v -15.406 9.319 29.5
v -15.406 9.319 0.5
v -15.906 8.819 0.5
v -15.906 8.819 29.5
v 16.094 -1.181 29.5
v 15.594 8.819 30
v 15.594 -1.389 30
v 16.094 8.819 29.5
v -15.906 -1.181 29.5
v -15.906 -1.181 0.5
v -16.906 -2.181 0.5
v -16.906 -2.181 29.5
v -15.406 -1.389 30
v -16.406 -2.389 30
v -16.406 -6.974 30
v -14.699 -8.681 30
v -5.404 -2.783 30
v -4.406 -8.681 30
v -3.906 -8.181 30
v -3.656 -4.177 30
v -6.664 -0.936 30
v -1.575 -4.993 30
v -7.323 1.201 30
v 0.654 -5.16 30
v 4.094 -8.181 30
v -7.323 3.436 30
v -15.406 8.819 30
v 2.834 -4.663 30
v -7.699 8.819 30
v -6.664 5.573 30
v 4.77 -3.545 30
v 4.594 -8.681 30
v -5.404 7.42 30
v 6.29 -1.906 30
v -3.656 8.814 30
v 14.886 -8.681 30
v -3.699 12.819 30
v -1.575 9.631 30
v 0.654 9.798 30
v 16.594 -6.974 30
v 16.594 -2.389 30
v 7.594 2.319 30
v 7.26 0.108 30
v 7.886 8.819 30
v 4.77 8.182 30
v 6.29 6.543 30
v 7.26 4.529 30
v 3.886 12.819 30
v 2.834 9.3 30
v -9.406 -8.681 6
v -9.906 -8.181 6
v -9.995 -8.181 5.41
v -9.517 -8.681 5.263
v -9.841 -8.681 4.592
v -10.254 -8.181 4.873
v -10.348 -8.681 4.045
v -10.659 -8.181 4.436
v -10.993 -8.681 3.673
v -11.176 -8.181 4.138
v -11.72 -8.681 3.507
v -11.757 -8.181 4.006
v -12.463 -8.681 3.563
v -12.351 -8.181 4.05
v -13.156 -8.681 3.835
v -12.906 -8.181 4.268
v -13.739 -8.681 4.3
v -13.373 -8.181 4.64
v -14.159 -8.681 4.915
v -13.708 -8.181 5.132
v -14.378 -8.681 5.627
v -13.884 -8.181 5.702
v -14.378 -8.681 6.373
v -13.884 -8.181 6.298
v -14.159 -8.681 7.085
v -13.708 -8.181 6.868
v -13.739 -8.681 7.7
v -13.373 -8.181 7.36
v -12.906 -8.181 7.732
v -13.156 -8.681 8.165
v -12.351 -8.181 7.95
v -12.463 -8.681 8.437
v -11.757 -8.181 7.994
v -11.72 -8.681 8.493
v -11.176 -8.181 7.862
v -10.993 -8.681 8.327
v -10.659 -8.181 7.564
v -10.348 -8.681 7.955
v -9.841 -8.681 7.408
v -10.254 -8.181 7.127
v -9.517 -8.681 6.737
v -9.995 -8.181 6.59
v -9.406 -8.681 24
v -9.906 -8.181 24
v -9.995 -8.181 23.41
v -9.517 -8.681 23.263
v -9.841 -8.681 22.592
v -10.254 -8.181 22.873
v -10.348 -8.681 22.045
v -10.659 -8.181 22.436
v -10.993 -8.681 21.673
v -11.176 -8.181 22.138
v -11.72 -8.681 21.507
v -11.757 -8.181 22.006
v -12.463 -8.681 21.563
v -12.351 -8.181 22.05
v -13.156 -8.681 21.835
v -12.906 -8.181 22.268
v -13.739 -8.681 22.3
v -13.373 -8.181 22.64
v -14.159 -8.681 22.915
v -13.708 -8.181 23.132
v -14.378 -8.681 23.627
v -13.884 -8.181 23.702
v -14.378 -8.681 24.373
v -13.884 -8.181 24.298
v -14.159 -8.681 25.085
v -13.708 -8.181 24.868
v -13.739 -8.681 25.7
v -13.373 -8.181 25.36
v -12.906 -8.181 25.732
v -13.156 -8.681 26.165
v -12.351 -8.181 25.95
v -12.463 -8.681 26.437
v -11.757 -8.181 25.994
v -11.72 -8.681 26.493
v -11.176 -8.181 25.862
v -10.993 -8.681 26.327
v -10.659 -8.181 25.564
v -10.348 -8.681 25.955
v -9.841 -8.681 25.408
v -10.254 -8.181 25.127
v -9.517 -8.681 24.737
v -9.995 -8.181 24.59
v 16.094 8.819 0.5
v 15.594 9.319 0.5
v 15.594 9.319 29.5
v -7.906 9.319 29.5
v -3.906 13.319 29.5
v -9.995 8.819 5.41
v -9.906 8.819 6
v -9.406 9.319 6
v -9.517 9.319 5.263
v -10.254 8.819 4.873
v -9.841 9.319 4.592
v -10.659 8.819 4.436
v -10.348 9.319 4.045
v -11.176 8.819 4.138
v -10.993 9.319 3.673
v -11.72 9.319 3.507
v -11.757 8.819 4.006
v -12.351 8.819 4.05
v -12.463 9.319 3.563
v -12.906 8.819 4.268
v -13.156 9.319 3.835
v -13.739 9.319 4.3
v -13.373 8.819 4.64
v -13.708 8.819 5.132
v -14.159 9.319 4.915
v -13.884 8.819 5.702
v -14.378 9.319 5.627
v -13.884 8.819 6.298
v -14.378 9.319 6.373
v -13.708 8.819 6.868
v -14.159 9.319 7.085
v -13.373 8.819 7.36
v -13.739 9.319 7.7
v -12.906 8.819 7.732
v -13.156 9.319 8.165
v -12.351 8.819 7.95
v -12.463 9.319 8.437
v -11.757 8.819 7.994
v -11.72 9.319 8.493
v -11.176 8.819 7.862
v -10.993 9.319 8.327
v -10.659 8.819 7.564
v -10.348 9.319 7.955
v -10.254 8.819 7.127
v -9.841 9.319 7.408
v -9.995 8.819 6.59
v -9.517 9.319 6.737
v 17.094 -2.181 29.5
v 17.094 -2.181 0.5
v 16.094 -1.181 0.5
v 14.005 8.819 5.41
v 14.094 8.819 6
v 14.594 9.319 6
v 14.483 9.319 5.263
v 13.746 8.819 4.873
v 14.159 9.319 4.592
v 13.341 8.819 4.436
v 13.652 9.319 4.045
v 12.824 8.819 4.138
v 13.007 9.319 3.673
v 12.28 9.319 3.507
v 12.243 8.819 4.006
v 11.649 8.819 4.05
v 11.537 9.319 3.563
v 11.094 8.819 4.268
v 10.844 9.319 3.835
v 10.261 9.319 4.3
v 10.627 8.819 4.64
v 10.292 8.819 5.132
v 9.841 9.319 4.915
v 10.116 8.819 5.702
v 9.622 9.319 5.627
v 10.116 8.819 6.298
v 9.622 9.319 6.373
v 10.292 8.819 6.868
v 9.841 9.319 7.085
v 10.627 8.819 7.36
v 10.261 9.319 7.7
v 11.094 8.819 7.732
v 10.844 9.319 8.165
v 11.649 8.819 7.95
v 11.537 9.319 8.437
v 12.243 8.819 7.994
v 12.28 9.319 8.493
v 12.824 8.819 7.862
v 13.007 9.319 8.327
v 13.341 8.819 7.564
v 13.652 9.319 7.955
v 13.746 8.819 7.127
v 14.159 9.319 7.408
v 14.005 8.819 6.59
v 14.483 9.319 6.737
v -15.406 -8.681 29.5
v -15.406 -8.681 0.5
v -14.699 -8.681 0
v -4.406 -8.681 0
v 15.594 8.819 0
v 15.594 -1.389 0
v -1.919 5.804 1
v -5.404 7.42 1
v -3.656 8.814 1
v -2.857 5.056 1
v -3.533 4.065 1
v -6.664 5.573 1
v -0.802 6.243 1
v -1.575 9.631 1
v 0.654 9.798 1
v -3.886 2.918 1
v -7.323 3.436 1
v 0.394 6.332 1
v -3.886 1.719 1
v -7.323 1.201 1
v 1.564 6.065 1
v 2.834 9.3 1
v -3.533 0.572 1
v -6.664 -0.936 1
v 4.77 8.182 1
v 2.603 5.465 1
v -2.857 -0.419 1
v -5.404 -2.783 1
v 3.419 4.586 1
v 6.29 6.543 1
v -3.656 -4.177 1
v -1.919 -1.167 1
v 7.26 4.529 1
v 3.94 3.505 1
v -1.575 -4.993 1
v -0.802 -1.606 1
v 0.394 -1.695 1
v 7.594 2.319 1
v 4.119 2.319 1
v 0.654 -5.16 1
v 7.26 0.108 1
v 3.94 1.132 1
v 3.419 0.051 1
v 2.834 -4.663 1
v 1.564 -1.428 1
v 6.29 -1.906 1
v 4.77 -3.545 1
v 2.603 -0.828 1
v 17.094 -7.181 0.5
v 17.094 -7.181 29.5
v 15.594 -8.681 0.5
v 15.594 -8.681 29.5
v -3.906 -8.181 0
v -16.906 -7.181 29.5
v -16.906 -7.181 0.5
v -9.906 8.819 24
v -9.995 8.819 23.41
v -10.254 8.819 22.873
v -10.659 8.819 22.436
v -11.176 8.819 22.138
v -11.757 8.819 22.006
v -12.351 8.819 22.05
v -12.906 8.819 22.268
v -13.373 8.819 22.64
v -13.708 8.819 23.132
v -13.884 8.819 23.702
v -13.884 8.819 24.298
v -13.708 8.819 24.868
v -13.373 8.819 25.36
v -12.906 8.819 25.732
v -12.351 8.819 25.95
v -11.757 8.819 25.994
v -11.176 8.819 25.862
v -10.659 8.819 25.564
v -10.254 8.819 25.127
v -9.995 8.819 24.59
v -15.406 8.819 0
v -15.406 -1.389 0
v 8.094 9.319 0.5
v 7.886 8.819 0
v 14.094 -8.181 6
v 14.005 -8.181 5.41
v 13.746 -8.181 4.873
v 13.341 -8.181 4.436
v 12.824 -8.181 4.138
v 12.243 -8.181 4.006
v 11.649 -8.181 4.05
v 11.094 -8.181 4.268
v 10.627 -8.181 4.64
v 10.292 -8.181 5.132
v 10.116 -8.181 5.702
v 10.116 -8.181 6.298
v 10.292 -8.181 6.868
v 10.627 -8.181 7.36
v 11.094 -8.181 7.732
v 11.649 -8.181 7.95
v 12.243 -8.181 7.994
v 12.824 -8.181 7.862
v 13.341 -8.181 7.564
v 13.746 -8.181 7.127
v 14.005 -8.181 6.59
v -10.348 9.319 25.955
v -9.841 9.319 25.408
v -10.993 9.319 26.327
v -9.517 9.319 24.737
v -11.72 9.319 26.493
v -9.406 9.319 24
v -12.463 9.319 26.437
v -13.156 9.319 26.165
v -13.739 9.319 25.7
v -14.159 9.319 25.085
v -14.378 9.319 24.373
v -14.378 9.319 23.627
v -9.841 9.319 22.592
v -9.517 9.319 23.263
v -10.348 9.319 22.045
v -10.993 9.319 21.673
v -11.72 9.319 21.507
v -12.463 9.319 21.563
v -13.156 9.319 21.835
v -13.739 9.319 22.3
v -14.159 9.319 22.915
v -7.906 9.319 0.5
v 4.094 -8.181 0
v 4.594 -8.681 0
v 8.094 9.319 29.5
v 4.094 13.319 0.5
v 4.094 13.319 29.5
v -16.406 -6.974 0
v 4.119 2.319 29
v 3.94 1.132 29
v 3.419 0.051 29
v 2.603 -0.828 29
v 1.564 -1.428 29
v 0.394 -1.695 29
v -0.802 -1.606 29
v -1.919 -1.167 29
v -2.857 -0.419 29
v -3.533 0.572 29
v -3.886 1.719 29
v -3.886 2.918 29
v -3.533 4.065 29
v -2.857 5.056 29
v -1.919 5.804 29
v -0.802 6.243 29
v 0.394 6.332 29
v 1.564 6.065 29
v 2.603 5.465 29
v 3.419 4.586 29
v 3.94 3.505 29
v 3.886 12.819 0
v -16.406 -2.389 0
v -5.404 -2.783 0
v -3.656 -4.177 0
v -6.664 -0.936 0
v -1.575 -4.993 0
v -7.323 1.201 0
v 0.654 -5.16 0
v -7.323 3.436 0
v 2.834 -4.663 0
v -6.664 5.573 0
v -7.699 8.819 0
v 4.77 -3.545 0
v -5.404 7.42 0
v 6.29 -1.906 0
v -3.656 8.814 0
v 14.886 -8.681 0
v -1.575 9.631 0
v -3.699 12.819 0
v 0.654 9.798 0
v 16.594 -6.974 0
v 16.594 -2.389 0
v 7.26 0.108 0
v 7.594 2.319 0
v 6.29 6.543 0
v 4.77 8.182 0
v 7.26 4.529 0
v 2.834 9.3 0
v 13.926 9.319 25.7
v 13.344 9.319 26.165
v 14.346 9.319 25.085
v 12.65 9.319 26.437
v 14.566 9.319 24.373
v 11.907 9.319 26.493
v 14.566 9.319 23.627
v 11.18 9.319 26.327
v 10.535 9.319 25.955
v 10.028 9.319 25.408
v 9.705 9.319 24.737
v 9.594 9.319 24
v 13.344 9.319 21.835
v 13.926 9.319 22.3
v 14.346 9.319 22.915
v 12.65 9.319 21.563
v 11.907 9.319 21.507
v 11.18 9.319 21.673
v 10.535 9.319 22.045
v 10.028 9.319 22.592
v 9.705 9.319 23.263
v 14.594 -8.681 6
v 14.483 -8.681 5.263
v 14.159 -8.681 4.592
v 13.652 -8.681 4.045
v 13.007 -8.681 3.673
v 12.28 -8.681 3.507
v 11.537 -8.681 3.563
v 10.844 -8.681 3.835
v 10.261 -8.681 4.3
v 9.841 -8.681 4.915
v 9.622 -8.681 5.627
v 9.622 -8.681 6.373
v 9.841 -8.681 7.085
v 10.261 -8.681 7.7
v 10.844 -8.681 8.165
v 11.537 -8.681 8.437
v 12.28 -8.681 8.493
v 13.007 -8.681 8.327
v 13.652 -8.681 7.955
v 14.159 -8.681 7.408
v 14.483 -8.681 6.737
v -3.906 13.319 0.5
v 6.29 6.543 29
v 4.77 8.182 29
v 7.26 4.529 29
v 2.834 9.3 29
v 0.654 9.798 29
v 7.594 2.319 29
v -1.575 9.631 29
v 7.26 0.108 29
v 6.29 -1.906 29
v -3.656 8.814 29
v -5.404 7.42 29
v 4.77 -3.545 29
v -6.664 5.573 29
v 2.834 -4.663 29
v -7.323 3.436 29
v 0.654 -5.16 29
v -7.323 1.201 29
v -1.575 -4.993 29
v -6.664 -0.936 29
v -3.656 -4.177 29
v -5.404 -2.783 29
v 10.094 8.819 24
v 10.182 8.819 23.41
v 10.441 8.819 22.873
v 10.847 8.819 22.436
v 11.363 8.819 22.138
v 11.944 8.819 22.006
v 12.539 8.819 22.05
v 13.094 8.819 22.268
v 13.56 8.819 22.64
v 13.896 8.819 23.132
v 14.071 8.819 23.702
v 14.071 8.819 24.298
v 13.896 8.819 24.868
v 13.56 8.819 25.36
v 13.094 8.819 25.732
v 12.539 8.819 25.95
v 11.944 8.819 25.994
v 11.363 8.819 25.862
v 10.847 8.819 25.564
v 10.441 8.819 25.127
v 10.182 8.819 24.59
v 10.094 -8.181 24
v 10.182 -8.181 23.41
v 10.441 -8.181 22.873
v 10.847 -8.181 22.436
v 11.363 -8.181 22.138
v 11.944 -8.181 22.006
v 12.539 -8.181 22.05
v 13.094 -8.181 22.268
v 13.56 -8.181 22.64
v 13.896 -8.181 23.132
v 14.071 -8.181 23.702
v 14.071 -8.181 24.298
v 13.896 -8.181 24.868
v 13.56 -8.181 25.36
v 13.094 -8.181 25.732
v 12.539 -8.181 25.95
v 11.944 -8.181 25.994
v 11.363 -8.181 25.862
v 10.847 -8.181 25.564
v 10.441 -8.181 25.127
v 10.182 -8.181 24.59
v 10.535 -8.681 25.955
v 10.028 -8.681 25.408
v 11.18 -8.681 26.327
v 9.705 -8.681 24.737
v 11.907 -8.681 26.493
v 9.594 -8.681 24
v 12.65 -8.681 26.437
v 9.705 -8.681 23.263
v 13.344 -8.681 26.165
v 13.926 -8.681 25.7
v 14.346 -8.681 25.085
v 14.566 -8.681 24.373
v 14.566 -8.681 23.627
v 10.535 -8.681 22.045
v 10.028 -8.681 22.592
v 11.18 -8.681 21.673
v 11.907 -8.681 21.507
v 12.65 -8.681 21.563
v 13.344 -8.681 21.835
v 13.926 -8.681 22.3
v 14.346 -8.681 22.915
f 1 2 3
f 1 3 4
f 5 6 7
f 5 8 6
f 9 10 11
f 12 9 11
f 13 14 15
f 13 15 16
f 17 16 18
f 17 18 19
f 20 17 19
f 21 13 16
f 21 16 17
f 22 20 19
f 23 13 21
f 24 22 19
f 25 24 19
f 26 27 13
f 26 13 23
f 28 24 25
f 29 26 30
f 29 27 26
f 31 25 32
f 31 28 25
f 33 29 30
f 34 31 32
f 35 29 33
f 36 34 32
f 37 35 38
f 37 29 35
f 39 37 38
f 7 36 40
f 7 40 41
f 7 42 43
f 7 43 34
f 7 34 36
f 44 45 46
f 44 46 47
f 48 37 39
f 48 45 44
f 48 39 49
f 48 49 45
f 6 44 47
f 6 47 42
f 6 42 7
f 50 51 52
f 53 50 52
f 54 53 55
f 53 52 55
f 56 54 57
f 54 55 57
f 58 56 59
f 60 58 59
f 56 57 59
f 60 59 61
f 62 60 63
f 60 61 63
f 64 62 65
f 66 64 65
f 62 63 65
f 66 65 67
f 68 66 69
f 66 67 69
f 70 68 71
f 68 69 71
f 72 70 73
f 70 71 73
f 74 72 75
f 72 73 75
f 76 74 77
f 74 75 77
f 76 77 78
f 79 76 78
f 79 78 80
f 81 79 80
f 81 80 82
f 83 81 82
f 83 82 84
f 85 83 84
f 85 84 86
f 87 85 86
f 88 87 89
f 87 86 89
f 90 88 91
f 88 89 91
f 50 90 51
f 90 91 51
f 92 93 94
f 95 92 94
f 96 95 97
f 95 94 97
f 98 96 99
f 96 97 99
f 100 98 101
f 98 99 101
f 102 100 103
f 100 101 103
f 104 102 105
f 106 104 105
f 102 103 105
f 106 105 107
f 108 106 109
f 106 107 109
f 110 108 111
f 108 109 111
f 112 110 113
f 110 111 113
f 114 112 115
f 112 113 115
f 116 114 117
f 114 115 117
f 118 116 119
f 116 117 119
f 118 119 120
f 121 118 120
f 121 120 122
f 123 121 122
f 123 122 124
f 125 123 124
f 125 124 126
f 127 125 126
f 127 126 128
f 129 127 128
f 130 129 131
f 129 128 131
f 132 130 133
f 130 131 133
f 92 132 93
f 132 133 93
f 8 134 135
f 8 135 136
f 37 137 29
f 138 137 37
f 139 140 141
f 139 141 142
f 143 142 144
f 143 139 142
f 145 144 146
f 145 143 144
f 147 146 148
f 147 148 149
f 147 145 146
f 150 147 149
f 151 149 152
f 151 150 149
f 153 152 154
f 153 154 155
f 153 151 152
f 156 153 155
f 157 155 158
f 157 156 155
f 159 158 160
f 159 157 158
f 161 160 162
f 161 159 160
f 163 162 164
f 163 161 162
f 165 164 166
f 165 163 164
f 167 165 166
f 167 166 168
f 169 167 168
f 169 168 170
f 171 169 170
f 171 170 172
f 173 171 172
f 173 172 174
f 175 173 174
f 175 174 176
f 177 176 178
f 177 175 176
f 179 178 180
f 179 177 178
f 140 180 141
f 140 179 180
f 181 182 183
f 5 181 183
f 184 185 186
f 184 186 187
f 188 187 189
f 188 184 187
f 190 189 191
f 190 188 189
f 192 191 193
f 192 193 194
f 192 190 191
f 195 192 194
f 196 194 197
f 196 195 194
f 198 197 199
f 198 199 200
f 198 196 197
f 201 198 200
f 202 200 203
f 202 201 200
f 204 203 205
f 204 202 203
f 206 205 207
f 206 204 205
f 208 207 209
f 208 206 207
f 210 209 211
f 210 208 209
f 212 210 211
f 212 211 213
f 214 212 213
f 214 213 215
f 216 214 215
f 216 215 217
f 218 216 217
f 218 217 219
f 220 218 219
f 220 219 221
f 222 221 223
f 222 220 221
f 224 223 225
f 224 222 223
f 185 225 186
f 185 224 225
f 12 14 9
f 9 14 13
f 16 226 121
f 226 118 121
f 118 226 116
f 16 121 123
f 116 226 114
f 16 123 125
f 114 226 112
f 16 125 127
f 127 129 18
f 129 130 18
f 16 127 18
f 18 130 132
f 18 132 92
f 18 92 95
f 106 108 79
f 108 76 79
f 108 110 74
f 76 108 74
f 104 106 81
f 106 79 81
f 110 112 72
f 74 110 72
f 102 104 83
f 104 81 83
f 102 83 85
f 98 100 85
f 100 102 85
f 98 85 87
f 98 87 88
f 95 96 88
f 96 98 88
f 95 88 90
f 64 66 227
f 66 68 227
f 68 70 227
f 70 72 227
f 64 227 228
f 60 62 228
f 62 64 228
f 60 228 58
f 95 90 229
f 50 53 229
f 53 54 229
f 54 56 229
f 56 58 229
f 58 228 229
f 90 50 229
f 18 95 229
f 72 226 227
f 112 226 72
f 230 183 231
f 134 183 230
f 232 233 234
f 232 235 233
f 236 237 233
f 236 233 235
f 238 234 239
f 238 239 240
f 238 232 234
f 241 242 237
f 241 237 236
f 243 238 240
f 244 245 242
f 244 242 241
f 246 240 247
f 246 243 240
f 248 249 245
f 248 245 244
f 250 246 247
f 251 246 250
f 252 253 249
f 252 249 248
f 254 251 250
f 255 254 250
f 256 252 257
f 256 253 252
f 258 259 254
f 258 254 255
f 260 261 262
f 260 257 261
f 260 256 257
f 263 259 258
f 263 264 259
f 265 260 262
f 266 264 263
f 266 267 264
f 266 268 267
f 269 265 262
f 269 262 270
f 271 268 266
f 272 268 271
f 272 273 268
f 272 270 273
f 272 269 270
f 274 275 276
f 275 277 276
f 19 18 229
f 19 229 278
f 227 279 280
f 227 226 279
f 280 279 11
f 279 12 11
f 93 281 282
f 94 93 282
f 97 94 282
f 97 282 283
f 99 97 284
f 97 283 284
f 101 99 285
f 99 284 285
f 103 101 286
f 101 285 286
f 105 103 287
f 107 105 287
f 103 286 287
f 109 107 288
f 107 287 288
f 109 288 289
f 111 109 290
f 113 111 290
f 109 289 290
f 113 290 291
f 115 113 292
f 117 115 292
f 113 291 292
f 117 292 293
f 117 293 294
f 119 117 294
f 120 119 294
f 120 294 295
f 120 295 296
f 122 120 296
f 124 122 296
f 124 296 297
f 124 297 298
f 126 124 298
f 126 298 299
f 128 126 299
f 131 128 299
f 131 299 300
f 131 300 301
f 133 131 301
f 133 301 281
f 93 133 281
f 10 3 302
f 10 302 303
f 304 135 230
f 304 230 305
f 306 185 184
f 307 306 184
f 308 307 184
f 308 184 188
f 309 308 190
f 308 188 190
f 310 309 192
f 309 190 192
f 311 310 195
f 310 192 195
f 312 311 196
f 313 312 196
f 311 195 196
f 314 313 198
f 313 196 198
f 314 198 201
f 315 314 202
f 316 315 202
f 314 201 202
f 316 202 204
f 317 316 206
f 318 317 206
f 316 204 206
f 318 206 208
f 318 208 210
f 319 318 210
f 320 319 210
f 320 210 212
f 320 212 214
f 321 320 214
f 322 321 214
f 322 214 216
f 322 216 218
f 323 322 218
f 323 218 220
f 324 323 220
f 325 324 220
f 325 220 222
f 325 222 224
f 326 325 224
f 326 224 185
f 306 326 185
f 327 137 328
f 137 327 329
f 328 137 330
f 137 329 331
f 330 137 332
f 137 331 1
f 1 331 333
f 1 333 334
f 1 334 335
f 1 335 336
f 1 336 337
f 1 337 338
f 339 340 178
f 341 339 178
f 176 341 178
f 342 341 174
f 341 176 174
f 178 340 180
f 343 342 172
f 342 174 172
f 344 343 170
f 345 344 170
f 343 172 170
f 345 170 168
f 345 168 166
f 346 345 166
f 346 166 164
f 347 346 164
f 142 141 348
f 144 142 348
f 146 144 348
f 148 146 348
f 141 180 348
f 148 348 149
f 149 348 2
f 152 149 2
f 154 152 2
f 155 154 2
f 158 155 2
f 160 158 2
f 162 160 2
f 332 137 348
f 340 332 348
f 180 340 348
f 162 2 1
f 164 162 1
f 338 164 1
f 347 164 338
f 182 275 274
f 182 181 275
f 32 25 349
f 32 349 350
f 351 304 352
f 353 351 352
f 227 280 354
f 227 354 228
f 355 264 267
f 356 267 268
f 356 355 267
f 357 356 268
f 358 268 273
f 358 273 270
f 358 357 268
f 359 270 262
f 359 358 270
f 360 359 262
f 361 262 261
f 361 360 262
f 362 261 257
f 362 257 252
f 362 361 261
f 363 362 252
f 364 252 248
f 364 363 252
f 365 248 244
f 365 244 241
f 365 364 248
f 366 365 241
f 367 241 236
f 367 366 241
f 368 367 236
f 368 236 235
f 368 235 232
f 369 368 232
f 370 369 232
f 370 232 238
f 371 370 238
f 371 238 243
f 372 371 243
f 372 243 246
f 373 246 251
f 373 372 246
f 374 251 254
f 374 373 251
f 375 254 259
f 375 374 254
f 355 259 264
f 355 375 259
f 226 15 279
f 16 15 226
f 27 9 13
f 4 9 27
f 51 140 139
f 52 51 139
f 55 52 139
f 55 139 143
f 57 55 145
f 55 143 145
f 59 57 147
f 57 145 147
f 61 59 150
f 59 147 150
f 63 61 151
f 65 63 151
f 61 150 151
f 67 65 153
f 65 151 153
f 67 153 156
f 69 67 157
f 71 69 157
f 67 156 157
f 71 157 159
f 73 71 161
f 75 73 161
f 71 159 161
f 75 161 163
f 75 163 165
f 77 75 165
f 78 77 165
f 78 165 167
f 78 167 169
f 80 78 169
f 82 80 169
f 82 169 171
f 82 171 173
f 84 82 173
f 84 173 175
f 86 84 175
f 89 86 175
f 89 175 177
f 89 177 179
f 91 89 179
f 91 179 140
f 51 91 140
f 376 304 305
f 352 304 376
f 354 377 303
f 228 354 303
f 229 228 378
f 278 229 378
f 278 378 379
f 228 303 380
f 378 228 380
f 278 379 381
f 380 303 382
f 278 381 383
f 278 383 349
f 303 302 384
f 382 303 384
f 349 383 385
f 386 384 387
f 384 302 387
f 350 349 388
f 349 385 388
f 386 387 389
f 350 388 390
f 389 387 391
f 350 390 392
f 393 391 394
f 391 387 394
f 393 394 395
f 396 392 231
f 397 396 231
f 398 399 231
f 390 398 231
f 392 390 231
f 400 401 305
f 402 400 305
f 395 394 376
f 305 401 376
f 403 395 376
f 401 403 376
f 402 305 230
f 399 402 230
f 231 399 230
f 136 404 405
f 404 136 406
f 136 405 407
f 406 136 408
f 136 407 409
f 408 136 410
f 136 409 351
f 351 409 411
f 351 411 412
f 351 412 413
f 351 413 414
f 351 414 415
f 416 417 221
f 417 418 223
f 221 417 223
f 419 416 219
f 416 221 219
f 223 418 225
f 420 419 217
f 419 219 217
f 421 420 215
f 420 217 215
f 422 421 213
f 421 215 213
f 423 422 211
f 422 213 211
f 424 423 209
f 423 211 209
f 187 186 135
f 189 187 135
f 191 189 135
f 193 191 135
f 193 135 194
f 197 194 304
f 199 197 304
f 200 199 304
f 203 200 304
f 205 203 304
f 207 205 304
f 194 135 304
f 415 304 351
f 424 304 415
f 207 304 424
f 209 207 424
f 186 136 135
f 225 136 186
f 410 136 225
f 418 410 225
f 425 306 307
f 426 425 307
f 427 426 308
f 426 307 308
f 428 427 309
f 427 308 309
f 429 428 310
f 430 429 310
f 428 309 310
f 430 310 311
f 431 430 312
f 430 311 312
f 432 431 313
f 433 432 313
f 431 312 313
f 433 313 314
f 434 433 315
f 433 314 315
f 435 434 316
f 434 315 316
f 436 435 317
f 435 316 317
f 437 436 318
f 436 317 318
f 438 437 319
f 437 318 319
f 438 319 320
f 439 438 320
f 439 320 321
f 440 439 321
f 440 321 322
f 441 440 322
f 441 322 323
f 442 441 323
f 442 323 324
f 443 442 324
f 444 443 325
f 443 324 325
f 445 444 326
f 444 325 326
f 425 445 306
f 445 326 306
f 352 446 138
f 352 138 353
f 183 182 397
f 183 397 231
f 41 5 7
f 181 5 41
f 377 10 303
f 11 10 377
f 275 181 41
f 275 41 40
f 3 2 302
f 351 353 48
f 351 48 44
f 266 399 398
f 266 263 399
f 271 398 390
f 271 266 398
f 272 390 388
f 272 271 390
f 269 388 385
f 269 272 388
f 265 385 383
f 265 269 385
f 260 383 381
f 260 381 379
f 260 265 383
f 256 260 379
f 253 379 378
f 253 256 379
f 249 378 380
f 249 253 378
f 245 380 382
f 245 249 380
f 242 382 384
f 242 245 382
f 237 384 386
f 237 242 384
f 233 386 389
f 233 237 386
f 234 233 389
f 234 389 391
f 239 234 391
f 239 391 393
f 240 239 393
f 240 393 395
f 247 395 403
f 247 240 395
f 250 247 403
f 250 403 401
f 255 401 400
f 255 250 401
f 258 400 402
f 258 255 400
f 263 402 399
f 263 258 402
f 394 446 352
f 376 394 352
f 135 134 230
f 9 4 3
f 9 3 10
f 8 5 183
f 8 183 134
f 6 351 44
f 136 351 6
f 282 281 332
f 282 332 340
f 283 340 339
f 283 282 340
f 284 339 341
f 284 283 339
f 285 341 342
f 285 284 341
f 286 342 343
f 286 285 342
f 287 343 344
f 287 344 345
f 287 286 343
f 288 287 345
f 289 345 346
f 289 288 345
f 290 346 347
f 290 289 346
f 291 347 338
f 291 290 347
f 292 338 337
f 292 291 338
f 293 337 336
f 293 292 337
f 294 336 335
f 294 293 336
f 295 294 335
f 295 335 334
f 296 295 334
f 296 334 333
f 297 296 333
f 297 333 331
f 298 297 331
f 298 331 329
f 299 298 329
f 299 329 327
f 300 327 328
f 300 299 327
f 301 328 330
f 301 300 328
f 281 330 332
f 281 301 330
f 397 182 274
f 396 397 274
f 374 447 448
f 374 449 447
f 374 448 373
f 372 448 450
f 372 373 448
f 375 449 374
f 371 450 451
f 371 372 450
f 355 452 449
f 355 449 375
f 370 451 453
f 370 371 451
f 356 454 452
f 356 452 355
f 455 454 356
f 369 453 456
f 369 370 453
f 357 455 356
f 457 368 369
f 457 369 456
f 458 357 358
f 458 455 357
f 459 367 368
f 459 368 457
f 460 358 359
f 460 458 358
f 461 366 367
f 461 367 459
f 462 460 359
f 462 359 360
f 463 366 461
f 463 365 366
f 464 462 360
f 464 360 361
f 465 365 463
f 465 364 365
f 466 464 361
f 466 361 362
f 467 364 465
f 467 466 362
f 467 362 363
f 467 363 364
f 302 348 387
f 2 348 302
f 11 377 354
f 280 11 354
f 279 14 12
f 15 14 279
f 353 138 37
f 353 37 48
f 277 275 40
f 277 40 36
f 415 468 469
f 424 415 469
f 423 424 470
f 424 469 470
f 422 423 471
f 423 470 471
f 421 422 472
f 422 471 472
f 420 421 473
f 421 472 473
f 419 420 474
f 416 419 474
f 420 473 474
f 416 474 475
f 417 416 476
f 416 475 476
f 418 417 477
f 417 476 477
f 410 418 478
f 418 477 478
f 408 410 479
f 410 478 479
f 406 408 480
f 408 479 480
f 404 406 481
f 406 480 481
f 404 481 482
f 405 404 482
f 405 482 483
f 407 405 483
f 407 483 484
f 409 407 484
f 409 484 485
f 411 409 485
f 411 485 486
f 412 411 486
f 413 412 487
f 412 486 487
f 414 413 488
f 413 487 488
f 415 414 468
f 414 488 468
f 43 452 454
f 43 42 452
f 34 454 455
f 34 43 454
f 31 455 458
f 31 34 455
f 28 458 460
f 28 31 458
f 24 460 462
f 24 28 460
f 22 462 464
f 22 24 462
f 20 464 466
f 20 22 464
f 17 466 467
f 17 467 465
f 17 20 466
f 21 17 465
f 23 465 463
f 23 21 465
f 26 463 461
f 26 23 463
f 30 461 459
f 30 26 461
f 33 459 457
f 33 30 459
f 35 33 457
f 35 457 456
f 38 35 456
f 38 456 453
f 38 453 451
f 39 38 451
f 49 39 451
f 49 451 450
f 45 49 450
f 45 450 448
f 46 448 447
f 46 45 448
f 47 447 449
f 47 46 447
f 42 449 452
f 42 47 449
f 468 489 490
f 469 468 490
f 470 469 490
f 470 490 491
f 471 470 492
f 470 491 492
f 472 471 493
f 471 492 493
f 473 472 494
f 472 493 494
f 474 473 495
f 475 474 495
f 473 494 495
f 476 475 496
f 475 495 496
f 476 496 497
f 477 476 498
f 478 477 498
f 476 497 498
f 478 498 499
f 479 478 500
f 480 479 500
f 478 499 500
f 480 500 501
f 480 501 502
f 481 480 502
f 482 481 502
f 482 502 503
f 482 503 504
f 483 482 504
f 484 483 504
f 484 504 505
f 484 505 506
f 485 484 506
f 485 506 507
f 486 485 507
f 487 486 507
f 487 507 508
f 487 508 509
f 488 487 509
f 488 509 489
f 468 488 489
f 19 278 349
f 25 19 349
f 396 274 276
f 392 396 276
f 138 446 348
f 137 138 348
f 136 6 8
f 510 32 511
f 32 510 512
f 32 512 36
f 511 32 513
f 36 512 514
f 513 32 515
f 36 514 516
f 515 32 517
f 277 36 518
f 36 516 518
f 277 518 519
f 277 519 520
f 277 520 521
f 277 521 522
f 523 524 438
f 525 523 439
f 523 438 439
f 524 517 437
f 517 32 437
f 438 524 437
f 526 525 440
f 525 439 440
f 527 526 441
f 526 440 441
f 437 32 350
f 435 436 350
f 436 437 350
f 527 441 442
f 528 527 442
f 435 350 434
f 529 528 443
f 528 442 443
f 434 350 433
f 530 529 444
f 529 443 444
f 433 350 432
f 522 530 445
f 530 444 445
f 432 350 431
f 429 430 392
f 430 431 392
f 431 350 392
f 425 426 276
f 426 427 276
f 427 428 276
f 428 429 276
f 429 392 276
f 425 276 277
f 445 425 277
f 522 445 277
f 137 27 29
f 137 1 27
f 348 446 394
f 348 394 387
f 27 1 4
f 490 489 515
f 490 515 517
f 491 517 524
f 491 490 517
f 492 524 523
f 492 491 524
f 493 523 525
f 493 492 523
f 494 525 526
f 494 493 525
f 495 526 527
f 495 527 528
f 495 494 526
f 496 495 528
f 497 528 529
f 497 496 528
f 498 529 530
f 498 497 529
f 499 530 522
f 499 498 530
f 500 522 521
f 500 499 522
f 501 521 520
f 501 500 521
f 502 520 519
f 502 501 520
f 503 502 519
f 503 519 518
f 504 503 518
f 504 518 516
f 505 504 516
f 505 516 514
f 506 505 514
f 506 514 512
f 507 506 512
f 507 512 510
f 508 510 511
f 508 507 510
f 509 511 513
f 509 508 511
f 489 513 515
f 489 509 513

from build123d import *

# Parameters (mm, degrees)
ESBO_O1_W                      = 34
ESBO_O1_H                      = 30
RESSALTO_EXTRUS_O1_DEPTH       = 22
CORTE_EXTRUS_O1_DEPTH          = 31
CORTE_EXTRUS_O2_DEPTH          = 31
CORTE_EXTRUS_O3_DEPTH          = 31
CORTE_EXTRUS_O4_DEPTH          = 31
CORTE_EXTRUS_O5_DEPTH          = 31
FURO_DE_DI_METRO_4_0_4_1_D     = 4
FURO_DE_DI_METRO_4_0_4_1_DEPTH = 18
FURO_DE_DI_METRO_4_0_4_2_D     = 4
FURO_DE_DI_METRO_4_0_4_2_DEPTH = 22
CHANFRO1_SIZE                  = 1.5
CHANFRO2_SIZE                  = 0.500000009


with BuildPart() as part:
    # Esboço1 → Ressalto-extrusão1 (new body)
    with BuildSketch(Plane(origin=(0, 13.318571188, 0), x_dir=(1, 0, 0), z_dir=(0, 1, 0))):
        with Locations((0.093581821, -15)):
            Rectangle(ESBO_O1_W, ESBO_O1_H)
    extrude(amount=-RESSALTO_EXTRUS_O1_DEPTH)

    # Esboço2 → Corte-extrusão1 (cut, through all)
    with BuildSketch(Plane(origin=(0, 0, 0), x_dir=(-1, 0, 0), z_dir=(0, 0, -1))):
        Polygon((-17.093581821, -2.181428812), (-16.093581821, -1.181428812), (-16.093581821, 13.318571188), (-17.093581821, 13.318571188), align=None)
    extrude(amount=-CORTE_EXTRUS_O1_DEPTH, mode=Mode.SUBTRACT)

    # Esboço3 → Corte-extrusão2 (cut, through all)
    with BuildSketch(Plane(origin=(0, 0, 0), x_dir=(-1, 0, 0), z_dir=(0, 0, -1))):
        Polygon((-16.093581821, 13.318571188), (-16.093581821, 9.318571188), (-8.093581821, 9.318571188), (-4.093581821, 13.318571188), align=None)
    extrude(amount=-CORTE_EXTRUS_O2_DEPTH, mode=Mode.SUBTRACT)

    # Esboço4 → Corte-extrusão3 (cut, through all)
    with BuildSketch(Plane(origin=(0, 0, 0), x_dir=(-1, 0, 0), z_dir=(0, 0, -1))):
        Polygon((16.906418179, 13.318571188), (3.906418179, 13.318571188), (7.906418179, 9.318571188), (16.906418179, 9.318571188), align=None)
    extrude(amount=-CORTE_EXTRUS_O3_DEPTH, mode=Mode.SUBTRACT)

    # Esboço5 → Corte-extrusão4 (cut, through all)
    with BuildSketch(Plane(origin=(0, 0, 0), x_dir=(-1, 0, 0), z_dir=(0, 0, -1))):
        Polygon((15.906418179, 9.318571188), (15.906418179, -1.181428812), (16.906418179, -2.181428812), (16.906418179, 9.318571188), align=None)
    extrude(amount=-CORTE_EXTRUS_O4_DEPTH, mode=Mode.SUBTRACT)

    # Esboço6 → Corte-extrusão5 (cut, through all)
    with BuildSketch(Plane(origin=(0, 0, 0), x_dir=(-1, 0, 0), z_dir=(0, 0, -1))):
        Polygon((-4.593581821, -8.681428812), (4.406418179, -8.681428812), (3.906418179, -8.181428812), (-4.093581821, -8.181428812), align=None)
    extrude(amount=-CORTE_EXTRUS_O5_DEPTH, mode=Mode.SUBTRACT)

    # Esboço7 → Corte-Revolução1 (revolve, cut)
    with BuildSketch(Plane.XZ.offset(-2.318571188)):
        Polygon((7.593581821, 30), (0.093581821, 30), (0.093581821, 0), (7.593581821, 0), (7.593581821, 1), (4.118581821, 1), (4.118581821, 29), (7.593581821, 29), align=None)
    revolve(axis=Axis((0.093581821, 2.318571188, 30), (0, 0, -1)), mode=Mode.SUBTRACT)

    # Furo de diâmetro Ø4.0 (4)1
    with Locations(Plane(origin=(0, 9.318571188, 0), x_dir=(1, 0, 0), z_dir=(0, 1, 0))):
        with Locations((12.093581821, -24)):
            Hole(FURO_DE_DI_METRO_4_0_4_1_D / 2, depth=FURO_DE_DI_METRO_4_0_4_1_DEPTH)

    # Furo de diâmetro Ø4.0 (4)2
    with Locations(Plane(origin=(0, -8.681428812, 0), x_dir=(-1, 0, 0), z_dir=(0, -1, 0))):
        with Locations((11.906418179, -6), (11.906418179, -24), (-12.093581821, -6)):
            Hole(FURO_DE_DI_METRO_4_0_4_2_D / 2, depth=FURO_DE_DI_METRO_4_0_4_2_DEPTH)

    # Chanfro1
    chanfro1_edges = [part.edges().sort_by_distance(p)[0] for p in [
        (17.093581821, -8.681428812, 15),
        (-16.906418179, -8.681428812, 15),
    ]]
    chamfer(chanfro1_edges, length=CHANFRO1_SIZE)

    # Chanfro2
    chanfro2_edges = [part.edges().sort_by_distance(p)[0] for p in [
        (10.093581821, 9.318571188, 6),
        (10.093581821, -8.681428812, 6),
        (-13.906418179, 9.318571188, 24),
        (-13.906418179, -8.681428812, 24),
        (-13.906418179, 9.318571188, 6),
        (-13.906418179, -8.681428812, 6),
        (17.093581821, -4.681428812, 30),
        (17.093581821, -4.681428812, 0),
        (-16.906418179, -4.681428812, 0),
        (-16.156418179, -7.931428812, 0),
        (16.343581821, -7.931428812, 0),
        (-16.906418179, -4.681428812, 30),
        (-16.156418179, -7.931428812, 30),
        (16.343581821, -7.931428812, 30),
        (16.093581821, 4.068571188, 30),
        (16.593581821, -1.681428812, 30),
        (16.593581821, -1.681428812, 0),
        (16.093581821, 4.068571188, 0),
        (0.093581821, 13.318571188, 0),
        (6.093581821, 11.318571188, 30),
        (12.093581821, 9.318571188, 30),
        (16.093581821, 9.318571188, 15),
        (12.093581821, 9.318571188, 0),
        (6.093581821, 11.318571188, 0),
        (0.093581821, 13.318571188, 30),
        (-11.906418179, 9.318571188, 30),
        (-5.906418179, 11.318571188, 30),
        (-5.906418179, 11.318571188, 0),
        (-11.906418179, 9.318571188, 0),
        (-15.906418179, 9.318571188, 15),
        (-16.406418179, -1.681428812, 30),
        (-15.906418179, 4.068571188, 30),
        (-15.906418179, 4.068571188, 0),
        (-16.406418179, -1.681428812, 0),
        (14.093581821, 9.318571188, 24),
        (14.093581821, -8.681428812, 24),
    ]]
    chamfer(chanfro2_edges, length=CHANFRO2_SIZE)


solid = part.part
